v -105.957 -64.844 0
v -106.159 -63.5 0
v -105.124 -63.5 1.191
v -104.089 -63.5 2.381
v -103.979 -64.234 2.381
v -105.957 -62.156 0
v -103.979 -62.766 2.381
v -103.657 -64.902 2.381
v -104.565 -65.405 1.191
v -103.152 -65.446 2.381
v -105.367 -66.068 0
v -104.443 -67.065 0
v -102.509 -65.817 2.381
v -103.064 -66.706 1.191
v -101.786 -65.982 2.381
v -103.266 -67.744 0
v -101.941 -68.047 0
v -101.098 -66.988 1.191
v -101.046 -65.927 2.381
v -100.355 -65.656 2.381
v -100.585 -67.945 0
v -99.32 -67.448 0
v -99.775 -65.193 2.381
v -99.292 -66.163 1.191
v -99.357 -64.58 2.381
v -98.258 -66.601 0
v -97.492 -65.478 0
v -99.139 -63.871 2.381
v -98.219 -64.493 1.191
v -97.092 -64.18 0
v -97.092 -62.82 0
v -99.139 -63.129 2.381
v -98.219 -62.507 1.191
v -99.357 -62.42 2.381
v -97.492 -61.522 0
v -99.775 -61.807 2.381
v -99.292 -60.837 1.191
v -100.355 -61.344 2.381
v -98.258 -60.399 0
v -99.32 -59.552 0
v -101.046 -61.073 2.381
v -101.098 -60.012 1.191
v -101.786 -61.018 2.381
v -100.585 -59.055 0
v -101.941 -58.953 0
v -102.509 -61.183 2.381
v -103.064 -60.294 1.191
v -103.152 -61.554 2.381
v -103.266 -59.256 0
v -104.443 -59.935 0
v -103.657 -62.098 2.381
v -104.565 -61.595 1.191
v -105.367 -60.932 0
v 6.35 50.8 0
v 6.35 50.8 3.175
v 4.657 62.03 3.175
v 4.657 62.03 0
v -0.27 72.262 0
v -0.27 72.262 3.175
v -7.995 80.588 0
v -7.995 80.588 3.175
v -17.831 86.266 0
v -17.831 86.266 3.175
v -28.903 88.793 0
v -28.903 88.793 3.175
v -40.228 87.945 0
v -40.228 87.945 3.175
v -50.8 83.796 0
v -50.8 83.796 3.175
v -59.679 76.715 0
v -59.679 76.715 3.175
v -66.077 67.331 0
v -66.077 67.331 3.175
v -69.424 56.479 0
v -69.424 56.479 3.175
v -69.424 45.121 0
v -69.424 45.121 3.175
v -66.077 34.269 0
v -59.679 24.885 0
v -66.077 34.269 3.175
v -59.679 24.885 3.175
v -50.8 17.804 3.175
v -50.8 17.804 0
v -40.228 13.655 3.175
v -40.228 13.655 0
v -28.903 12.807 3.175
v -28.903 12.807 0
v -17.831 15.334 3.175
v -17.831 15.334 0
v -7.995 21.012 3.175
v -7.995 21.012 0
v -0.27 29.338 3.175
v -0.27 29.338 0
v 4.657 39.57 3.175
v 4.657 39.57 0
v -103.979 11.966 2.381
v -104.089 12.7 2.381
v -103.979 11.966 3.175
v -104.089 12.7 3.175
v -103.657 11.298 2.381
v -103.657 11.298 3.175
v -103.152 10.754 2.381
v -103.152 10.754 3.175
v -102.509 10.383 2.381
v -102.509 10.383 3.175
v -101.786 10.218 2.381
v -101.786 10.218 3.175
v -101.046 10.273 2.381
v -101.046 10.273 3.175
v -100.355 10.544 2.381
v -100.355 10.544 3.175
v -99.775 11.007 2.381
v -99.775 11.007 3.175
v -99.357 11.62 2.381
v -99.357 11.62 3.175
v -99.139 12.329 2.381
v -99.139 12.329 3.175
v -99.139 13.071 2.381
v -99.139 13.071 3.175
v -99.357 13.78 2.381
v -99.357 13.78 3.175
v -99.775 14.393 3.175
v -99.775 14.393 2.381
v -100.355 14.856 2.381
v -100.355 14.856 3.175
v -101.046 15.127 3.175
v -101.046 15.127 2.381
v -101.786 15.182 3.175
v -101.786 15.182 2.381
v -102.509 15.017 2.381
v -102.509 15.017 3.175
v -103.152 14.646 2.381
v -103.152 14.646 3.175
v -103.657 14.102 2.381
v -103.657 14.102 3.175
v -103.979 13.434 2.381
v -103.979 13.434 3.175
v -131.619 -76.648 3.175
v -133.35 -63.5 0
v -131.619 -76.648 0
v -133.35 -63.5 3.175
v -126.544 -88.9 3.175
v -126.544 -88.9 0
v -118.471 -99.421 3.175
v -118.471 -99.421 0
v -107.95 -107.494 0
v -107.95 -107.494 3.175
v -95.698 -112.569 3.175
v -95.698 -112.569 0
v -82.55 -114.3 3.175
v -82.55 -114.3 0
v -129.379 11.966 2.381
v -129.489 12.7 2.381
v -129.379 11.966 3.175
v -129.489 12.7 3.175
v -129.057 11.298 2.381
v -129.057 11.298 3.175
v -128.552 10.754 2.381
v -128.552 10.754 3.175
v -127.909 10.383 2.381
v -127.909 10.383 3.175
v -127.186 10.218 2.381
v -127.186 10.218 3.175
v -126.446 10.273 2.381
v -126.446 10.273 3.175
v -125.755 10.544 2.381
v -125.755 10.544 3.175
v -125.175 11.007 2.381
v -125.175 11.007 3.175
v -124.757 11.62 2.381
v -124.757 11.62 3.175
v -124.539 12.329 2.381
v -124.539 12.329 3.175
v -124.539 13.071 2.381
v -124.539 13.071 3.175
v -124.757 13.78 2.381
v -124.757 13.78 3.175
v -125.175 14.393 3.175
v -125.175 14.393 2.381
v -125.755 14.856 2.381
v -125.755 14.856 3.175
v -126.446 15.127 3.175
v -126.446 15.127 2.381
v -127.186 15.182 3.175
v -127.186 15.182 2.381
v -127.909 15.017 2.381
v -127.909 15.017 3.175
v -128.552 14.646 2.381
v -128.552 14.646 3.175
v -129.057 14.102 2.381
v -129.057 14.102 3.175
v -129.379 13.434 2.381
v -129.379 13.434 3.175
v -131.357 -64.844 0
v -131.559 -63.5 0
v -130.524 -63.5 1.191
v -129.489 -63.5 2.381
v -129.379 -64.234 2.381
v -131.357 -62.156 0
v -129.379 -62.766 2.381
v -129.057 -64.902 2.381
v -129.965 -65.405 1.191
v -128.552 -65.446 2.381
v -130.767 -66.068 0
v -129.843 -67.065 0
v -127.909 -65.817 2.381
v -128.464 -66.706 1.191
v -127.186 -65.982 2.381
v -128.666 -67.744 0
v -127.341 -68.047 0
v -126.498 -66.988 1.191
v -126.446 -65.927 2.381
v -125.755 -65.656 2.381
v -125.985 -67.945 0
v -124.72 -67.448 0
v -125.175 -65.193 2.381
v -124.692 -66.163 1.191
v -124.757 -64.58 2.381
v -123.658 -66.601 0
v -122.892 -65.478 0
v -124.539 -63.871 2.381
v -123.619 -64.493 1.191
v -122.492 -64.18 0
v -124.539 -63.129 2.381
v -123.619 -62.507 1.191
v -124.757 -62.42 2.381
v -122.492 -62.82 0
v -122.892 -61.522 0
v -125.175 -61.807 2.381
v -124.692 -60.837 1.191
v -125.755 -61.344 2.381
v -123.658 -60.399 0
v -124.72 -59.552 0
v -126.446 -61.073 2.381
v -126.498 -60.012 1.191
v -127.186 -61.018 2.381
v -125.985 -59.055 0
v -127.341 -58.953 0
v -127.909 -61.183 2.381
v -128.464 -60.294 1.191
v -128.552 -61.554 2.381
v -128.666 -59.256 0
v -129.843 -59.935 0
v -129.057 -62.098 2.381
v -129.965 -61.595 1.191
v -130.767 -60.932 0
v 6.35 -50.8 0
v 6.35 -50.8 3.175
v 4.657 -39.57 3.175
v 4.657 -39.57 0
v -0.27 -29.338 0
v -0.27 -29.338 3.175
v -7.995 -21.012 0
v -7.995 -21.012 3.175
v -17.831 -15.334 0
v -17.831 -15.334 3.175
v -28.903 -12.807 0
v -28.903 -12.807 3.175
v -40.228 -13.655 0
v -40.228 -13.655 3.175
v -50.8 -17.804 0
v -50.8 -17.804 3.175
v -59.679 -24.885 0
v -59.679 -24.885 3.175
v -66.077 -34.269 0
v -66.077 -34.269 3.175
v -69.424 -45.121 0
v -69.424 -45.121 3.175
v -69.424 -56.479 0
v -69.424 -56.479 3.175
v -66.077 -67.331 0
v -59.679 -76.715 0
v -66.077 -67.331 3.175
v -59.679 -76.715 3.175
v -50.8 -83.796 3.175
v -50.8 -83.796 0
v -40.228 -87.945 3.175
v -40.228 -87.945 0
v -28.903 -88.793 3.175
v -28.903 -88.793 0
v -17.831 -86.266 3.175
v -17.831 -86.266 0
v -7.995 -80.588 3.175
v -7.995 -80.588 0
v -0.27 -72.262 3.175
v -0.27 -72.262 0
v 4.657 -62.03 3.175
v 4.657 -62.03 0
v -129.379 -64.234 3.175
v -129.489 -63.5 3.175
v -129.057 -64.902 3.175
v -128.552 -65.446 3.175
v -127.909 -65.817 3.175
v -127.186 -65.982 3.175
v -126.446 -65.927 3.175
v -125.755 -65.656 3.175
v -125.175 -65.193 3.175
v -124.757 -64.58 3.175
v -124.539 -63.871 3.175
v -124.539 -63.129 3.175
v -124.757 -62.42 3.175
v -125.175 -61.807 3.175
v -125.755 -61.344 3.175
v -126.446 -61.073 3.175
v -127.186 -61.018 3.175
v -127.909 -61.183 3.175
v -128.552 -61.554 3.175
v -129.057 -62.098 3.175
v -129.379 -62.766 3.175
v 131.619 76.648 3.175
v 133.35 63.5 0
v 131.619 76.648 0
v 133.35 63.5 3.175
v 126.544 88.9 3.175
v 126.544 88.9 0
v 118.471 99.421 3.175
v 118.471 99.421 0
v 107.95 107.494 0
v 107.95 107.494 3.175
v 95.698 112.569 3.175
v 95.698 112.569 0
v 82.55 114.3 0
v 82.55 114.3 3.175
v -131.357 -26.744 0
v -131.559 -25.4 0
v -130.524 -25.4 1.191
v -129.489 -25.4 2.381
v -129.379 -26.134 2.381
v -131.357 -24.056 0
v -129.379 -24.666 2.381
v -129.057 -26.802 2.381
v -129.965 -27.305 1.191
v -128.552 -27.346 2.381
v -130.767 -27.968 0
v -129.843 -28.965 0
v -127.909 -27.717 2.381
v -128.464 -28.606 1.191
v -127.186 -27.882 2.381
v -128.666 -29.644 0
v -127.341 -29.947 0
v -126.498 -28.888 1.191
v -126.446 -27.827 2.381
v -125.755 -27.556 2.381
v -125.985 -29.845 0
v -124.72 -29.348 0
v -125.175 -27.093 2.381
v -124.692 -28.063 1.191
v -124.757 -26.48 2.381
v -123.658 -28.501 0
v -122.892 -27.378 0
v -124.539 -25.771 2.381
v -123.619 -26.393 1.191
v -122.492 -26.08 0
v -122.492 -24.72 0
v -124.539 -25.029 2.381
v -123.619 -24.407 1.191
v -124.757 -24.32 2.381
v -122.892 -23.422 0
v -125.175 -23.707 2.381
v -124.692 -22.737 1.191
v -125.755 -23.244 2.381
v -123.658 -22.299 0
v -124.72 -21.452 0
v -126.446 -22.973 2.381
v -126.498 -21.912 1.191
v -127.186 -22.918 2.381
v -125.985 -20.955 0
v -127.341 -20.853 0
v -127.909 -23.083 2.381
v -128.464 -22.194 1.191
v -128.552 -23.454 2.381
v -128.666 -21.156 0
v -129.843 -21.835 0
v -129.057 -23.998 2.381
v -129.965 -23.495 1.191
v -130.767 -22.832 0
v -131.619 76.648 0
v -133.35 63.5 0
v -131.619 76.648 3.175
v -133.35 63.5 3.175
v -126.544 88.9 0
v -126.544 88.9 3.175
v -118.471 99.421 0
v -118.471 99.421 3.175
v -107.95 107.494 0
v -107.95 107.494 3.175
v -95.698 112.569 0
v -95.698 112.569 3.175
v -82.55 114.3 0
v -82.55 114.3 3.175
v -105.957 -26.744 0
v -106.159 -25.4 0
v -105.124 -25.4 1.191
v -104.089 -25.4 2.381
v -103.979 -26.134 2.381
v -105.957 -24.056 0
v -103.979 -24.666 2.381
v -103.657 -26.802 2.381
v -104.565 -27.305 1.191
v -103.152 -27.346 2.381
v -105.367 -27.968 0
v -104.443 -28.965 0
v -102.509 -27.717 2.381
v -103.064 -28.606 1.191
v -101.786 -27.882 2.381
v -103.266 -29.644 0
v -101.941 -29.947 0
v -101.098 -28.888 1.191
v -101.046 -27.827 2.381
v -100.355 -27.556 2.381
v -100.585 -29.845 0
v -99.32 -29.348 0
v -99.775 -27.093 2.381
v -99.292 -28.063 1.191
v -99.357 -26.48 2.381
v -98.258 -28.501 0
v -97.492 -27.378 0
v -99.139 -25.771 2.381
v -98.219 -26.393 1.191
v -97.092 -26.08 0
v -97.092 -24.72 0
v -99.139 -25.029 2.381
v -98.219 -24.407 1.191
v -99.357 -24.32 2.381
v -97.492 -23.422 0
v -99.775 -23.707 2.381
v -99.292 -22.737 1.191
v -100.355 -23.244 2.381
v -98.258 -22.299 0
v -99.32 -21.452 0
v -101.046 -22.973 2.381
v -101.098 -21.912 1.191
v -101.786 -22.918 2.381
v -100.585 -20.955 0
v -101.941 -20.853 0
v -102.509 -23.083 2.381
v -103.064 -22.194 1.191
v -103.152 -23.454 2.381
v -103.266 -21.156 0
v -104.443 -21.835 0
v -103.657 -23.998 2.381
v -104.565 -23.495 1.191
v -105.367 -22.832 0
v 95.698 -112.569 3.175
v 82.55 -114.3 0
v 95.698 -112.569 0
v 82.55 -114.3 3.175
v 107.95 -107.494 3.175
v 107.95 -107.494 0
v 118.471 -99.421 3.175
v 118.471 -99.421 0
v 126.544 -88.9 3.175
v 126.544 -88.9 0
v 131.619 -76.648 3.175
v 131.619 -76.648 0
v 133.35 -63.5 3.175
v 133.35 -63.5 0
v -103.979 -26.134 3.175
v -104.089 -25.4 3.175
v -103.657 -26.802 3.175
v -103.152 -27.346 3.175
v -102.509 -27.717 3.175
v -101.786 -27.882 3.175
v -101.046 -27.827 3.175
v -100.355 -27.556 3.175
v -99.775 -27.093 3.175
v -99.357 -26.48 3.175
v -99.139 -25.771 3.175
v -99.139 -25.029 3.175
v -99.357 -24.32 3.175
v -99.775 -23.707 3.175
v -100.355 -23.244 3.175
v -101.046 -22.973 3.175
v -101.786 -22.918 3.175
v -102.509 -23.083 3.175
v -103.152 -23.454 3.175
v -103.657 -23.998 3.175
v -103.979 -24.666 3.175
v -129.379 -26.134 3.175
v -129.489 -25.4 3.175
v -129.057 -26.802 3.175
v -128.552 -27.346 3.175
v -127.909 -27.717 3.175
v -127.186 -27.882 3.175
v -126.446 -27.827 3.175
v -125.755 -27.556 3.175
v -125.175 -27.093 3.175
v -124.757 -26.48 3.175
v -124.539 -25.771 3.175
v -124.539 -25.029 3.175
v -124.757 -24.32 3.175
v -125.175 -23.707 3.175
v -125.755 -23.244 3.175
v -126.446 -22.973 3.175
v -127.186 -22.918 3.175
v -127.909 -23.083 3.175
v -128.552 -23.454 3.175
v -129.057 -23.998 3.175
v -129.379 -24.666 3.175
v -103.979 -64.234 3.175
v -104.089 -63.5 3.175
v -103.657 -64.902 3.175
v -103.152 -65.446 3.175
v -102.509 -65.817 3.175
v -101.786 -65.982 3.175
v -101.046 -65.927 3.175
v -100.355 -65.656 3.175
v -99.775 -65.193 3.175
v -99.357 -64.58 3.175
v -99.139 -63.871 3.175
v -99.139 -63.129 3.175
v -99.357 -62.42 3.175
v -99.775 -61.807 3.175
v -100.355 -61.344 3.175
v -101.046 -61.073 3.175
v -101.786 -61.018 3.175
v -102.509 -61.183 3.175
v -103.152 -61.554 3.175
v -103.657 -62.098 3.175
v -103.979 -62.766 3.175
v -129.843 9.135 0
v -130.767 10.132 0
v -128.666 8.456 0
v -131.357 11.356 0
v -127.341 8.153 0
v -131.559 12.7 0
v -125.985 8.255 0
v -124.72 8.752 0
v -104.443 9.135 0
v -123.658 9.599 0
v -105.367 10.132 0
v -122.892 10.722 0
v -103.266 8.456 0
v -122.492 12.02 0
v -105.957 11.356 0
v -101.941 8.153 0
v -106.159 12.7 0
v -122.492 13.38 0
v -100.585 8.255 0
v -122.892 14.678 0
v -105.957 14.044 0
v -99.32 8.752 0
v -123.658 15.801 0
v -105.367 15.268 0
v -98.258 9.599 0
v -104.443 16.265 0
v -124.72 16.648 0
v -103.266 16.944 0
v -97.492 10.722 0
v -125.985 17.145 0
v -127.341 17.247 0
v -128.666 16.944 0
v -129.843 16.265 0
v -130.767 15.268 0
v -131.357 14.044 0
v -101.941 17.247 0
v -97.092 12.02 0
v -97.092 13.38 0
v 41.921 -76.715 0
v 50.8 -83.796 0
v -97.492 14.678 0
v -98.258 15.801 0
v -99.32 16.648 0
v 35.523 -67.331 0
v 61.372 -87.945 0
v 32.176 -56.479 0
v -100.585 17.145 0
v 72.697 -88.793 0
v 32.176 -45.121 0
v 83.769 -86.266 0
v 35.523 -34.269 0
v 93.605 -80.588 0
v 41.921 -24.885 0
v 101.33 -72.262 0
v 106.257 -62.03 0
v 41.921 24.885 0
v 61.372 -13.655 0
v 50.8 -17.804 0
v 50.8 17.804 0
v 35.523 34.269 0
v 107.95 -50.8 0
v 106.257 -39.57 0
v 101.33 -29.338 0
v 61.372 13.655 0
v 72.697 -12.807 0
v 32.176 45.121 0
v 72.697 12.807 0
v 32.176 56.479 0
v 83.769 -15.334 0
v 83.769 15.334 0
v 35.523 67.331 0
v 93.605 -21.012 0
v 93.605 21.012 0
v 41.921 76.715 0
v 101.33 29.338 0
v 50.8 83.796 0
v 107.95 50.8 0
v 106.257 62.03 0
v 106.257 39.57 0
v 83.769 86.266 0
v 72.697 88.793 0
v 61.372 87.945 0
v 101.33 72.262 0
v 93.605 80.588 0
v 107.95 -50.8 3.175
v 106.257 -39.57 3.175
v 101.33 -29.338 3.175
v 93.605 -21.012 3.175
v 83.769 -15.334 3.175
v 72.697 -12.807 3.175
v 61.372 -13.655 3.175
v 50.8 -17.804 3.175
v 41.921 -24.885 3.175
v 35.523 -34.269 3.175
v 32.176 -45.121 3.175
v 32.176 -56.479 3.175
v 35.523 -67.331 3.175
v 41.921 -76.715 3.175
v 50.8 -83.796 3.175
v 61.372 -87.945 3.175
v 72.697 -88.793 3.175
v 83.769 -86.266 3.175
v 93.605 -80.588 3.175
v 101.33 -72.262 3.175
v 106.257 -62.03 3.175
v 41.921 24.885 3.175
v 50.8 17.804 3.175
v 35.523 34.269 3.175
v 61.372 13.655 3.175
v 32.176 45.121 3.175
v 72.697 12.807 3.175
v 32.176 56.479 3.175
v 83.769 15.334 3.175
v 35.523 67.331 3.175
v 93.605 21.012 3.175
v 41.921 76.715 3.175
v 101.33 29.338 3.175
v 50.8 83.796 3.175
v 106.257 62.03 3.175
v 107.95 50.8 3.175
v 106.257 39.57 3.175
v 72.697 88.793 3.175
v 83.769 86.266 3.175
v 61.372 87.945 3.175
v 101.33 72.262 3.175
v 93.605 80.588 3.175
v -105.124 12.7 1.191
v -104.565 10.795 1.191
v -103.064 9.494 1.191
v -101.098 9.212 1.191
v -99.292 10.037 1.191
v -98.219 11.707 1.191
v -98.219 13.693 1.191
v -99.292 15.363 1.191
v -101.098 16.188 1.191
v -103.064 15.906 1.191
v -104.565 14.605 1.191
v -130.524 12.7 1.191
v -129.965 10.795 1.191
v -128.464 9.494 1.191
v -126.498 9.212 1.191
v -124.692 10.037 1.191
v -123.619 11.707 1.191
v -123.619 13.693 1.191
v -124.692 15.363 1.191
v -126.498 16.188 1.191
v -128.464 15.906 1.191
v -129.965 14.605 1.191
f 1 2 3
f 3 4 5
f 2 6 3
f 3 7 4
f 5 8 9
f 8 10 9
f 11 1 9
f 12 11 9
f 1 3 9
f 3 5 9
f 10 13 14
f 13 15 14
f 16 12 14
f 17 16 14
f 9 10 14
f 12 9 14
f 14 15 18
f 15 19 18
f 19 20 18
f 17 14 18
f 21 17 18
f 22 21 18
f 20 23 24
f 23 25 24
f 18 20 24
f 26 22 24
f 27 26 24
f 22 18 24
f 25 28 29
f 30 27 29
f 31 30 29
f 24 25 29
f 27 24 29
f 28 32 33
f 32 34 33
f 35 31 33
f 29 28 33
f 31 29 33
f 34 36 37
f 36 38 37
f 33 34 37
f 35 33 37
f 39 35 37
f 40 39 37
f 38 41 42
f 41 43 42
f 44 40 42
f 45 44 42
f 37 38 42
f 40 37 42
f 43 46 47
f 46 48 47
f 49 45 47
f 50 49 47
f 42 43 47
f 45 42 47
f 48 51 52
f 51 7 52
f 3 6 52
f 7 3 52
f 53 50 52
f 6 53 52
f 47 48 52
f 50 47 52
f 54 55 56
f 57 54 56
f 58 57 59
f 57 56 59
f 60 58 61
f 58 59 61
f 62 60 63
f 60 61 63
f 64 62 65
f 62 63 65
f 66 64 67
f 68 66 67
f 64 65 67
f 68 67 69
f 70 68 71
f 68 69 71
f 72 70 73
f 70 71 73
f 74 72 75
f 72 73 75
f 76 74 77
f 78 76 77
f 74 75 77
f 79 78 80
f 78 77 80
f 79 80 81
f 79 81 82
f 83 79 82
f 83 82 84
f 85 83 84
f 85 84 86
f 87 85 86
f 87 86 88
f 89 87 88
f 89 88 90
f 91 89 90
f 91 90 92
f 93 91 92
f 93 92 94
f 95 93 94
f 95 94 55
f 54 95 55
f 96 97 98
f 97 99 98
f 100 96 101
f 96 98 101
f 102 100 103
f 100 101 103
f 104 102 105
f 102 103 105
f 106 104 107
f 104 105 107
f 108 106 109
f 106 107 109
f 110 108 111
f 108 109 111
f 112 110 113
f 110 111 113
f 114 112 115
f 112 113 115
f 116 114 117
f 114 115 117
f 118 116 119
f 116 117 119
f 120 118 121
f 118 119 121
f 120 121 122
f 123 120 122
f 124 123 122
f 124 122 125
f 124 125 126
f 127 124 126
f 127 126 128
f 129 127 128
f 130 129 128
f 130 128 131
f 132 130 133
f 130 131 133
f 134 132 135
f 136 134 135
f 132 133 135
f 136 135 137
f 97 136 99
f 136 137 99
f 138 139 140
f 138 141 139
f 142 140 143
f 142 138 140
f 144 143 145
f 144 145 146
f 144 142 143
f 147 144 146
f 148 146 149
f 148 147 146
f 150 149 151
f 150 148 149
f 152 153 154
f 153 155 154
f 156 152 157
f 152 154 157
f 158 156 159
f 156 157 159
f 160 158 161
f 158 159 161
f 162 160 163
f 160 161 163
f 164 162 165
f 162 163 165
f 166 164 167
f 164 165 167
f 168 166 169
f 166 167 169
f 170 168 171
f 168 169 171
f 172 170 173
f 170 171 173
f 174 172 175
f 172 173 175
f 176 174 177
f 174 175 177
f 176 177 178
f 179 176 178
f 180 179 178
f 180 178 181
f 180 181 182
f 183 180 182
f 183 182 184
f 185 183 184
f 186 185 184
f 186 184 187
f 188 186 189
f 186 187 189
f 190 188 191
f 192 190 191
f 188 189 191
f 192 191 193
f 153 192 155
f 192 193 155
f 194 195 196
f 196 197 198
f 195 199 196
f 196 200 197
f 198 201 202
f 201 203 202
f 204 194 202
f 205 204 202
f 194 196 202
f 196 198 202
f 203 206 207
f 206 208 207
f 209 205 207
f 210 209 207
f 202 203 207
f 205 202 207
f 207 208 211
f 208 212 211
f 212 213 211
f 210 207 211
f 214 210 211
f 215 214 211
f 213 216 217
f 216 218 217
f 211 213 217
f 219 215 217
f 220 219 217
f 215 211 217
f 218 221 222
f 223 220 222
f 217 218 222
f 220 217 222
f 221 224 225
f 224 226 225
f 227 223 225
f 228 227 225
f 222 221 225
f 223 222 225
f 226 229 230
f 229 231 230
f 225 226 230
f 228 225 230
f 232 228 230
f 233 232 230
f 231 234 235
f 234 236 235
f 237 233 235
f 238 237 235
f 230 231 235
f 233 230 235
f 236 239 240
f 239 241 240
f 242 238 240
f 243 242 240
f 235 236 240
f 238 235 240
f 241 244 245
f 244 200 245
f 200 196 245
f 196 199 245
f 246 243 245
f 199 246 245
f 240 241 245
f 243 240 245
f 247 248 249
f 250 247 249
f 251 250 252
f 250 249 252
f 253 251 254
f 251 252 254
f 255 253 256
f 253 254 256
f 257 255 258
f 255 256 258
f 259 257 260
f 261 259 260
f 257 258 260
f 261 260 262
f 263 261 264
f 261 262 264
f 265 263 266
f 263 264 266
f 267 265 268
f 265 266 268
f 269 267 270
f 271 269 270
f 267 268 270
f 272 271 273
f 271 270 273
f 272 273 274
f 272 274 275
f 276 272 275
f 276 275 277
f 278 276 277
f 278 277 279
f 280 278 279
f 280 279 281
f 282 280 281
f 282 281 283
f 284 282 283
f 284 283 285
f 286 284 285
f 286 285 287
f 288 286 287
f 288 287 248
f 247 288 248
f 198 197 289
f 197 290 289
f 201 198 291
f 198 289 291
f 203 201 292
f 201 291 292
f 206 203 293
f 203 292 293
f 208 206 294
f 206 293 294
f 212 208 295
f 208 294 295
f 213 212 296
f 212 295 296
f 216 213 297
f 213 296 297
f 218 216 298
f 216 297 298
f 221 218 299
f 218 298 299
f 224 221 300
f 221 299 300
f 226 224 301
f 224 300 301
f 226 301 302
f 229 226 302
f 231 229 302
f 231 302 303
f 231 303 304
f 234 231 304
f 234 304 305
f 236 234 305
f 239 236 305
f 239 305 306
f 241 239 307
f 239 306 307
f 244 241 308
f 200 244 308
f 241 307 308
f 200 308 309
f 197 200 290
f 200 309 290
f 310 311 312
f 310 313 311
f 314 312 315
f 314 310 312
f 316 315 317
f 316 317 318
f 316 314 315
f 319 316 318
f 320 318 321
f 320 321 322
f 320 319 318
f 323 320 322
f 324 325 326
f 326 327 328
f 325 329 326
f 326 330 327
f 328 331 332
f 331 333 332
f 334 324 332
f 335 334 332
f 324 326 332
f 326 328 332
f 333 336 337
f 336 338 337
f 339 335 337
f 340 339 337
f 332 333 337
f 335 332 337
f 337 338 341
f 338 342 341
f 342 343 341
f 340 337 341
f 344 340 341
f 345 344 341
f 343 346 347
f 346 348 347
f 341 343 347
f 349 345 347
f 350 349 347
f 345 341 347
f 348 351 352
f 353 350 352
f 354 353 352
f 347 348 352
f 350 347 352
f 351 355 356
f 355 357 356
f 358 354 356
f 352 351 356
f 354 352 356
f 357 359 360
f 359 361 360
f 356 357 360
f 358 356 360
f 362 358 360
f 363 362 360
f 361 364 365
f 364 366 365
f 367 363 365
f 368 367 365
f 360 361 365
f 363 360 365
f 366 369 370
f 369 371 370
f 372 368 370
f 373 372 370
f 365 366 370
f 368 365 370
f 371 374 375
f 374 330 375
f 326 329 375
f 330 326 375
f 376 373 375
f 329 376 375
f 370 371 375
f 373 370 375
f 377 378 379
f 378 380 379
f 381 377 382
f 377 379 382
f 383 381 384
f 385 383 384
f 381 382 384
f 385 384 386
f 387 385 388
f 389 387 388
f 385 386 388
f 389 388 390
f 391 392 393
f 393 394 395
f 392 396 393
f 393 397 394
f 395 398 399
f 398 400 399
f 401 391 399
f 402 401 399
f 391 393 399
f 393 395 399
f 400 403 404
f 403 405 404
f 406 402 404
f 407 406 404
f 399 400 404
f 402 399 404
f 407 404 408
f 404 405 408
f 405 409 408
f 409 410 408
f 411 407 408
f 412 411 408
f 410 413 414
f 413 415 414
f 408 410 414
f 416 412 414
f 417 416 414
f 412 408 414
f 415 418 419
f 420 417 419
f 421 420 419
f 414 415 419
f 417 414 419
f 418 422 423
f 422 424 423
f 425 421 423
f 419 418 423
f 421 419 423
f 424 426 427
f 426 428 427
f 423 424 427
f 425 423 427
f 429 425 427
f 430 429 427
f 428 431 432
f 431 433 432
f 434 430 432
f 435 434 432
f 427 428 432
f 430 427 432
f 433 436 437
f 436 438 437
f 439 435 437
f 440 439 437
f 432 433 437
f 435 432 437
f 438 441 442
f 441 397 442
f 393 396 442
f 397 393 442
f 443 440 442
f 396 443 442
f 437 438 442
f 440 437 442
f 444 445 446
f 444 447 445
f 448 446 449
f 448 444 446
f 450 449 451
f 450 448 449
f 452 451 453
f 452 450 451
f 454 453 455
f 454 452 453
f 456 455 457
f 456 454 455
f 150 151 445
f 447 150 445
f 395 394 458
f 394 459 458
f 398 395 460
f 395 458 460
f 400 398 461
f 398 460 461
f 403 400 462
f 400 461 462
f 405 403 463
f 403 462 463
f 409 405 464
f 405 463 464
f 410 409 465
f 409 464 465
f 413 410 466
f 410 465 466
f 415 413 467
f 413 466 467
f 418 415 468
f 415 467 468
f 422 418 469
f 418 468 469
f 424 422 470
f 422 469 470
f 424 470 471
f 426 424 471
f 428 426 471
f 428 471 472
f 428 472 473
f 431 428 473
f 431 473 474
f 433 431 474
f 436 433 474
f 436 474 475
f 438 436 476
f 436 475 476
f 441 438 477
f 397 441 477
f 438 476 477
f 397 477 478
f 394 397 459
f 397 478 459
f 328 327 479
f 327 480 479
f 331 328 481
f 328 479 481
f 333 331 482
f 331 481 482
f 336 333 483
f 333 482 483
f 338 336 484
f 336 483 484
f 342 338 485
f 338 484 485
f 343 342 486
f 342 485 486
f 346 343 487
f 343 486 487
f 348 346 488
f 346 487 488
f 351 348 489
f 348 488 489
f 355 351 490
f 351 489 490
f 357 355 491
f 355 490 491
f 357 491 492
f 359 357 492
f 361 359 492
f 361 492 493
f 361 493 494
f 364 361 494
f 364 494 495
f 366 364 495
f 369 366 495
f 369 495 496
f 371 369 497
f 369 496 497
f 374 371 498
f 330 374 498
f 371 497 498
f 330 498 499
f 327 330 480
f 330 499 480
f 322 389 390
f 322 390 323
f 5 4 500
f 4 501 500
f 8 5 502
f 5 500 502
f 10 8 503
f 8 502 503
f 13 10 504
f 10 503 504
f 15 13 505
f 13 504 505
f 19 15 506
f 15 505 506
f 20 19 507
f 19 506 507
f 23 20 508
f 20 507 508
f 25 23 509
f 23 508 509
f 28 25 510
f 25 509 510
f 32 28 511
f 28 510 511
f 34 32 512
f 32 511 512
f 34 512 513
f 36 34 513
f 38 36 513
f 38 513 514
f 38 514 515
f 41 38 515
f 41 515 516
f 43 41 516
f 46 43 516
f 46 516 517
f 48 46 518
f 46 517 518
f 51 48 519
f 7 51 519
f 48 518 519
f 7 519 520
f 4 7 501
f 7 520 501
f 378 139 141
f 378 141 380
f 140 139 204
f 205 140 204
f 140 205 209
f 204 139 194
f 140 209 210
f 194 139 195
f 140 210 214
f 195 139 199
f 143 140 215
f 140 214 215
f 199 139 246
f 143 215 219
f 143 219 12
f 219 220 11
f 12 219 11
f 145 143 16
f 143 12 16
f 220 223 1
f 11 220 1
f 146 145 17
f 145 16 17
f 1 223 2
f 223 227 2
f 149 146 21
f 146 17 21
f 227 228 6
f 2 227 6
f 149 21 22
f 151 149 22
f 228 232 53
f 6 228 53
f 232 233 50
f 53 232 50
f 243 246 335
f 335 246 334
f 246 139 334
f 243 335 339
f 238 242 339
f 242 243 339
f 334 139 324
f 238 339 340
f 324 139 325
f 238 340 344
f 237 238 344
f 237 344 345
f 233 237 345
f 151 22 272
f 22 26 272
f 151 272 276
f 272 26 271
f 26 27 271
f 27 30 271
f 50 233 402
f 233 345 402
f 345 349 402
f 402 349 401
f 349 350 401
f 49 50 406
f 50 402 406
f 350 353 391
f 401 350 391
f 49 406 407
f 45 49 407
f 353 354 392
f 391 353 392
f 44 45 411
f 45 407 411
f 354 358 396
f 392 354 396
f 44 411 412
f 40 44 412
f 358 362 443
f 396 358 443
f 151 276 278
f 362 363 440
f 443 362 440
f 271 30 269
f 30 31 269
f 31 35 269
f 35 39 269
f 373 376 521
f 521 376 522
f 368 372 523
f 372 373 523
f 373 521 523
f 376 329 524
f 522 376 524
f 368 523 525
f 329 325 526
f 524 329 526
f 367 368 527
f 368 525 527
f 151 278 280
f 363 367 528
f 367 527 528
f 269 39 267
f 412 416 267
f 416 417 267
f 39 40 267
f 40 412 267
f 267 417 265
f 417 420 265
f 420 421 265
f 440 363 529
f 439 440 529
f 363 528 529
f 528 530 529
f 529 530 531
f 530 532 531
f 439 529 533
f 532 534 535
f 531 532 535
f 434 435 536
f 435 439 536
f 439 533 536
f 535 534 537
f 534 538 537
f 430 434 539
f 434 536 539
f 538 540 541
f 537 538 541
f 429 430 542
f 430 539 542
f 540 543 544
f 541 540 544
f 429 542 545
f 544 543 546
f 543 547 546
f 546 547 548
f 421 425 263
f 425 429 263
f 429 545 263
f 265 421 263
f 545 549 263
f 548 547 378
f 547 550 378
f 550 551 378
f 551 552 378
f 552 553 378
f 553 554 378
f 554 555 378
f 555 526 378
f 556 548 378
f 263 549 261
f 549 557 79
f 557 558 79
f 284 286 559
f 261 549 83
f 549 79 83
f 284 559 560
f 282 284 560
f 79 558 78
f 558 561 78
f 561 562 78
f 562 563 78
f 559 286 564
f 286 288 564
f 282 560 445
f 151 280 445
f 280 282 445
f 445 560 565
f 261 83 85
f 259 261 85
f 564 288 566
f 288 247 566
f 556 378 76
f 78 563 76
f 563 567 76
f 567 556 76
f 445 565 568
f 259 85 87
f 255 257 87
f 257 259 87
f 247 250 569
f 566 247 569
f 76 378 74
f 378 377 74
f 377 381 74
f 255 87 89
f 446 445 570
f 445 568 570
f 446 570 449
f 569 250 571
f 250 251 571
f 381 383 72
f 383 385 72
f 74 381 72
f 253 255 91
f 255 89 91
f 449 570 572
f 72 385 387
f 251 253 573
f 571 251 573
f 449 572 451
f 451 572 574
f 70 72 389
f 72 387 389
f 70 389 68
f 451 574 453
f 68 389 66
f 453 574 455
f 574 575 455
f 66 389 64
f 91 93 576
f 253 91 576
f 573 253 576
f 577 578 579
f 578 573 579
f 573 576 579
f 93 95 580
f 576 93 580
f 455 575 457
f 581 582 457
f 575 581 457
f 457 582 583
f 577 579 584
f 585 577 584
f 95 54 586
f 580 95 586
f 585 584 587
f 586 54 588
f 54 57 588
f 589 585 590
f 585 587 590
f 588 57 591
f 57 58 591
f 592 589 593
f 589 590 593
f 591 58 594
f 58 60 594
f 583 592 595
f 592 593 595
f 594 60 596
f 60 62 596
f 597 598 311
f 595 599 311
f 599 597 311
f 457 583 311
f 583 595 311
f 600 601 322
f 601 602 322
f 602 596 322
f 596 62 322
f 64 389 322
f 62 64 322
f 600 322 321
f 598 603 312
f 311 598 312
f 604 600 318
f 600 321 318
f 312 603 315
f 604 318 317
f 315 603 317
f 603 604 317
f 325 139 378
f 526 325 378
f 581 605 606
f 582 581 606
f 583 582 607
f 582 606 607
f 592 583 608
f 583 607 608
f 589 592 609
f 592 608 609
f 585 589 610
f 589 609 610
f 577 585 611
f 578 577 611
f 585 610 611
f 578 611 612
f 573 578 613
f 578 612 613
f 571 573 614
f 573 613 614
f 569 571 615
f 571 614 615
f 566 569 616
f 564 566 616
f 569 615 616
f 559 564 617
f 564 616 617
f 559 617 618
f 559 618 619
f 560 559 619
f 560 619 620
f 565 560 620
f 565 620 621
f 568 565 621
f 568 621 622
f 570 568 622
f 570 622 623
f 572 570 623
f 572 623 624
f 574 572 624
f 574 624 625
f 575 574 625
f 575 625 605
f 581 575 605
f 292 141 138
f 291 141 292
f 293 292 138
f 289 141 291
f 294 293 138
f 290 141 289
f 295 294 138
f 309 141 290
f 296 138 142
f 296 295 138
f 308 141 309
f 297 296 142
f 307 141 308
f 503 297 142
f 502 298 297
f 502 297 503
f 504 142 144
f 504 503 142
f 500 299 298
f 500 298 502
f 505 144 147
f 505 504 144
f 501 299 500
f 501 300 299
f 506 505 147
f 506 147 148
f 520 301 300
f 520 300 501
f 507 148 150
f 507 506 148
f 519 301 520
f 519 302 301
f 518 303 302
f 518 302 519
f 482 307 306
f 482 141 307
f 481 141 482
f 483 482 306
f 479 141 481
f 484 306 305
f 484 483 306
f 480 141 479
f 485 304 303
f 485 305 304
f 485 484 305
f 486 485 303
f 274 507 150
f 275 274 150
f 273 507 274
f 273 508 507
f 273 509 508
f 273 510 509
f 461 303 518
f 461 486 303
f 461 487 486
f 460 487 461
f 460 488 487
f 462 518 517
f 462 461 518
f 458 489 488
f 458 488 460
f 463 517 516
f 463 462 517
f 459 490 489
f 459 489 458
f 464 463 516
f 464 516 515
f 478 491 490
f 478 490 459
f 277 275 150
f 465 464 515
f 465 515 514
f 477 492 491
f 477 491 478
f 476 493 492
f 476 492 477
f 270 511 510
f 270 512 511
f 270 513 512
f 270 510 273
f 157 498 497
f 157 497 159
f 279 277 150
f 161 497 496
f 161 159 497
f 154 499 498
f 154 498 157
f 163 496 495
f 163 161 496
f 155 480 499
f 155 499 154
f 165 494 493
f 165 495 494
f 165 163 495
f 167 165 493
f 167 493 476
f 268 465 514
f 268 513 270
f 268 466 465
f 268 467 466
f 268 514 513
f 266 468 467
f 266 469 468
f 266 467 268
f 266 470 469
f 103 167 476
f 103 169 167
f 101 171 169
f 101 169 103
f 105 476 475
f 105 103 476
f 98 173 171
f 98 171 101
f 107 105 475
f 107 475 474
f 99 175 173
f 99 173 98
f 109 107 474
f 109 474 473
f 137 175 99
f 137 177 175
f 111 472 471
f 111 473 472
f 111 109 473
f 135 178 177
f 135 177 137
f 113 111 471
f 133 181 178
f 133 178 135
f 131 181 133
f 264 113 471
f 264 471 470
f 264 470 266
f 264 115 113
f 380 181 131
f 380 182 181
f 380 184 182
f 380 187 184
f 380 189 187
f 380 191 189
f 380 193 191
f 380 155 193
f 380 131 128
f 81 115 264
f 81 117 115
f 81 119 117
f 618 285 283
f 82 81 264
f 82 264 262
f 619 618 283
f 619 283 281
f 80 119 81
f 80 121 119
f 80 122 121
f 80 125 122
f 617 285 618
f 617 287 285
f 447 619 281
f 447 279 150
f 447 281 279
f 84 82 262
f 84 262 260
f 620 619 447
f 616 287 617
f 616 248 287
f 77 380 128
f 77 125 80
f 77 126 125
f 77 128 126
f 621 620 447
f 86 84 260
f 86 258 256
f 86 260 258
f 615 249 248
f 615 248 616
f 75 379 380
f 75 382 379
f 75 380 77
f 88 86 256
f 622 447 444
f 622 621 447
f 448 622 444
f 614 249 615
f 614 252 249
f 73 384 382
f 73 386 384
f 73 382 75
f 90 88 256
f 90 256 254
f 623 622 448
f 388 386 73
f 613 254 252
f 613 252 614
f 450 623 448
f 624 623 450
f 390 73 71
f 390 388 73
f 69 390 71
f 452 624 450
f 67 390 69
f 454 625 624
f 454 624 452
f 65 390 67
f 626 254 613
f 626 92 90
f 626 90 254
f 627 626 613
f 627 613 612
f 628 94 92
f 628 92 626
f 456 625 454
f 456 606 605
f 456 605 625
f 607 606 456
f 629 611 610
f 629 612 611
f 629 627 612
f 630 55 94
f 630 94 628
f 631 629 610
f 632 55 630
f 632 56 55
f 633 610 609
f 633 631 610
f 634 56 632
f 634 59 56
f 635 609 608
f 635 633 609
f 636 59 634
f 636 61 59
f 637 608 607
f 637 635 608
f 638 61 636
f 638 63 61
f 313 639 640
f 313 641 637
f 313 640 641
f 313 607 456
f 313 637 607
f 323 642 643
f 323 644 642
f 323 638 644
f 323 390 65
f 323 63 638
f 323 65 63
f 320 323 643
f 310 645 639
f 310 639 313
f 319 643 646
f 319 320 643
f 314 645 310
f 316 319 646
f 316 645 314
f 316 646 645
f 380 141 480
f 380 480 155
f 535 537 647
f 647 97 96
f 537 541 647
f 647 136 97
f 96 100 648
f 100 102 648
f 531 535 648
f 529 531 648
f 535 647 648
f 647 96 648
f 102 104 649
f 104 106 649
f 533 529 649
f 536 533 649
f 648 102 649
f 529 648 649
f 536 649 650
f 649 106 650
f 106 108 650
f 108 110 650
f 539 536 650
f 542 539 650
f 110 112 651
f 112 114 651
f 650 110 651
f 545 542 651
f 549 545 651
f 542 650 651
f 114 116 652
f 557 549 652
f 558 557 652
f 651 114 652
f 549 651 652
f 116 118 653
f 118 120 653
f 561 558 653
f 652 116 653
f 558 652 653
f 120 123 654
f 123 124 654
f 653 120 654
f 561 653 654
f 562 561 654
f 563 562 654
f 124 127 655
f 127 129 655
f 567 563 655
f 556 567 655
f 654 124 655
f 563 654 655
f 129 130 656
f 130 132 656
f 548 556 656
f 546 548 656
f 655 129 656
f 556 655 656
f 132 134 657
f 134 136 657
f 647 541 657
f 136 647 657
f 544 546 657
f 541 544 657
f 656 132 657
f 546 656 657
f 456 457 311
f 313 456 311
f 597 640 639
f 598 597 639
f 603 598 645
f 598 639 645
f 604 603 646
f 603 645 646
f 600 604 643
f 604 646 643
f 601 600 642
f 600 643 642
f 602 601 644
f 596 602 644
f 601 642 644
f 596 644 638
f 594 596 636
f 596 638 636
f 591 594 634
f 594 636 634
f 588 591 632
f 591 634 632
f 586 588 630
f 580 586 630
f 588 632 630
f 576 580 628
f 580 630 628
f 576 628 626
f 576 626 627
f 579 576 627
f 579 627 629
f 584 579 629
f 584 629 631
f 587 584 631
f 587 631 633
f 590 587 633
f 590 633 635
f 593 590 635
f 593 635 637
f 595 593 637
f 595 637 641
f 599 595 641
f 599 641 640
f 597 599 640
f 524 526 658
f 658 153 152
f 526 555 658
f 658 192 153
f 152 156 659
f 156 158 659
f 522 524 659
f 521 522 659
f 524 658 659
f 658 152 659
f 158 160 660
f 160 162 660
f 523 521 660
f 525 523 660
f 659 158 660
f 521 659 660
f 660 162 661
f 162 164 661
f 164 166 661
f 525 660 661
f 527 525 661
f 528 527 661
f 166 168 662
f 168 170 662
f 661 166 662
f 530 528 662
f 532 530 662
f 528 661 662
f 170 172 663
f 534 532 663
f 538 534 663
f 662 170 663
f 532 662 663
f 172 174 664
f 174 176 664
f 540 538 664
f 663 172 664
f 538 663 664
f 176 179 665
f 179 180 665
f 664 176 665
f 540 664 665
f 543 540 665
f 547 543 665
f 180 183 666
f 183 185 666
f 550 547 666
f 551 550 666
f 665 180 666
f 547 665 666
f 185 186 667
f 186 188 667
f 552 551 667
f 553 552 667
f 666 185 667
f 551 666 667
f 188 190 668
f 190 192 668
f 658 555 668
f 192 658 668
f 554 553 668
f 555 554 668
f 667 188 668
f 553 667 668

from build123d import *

# Parameters (mm, degrees)
F0_W           = 266.7
F0_H           = 228.6
F1_DEPTH       = 3.175
F2_R           = 50.8
F4_D           = 4.9784
F4_CSINK_D     = 9.1186
F4_CSINK_ANGLE = 82
F5_R           = 38.1
F6_DEPTH       = 3.176


with BuildPart() as f1:
    # F0 (on Top) → F1 (new body)
    with BuildSketch(Plane.XY):
        Rectangle(F0_W, F0_H)
    extrude(amount=F1_DEPTH)

    # F2
    f2_edges = [f1.edges().sort_by_distance(p)[0] for p in [
        (-133.35, 114.3, 1.5875),
        (133.35, 114.3, 1.5875),
        (133.35, -114.3, 1.5875),
        (-133.35, -114.3, 1.5875),
    ]]
    fillet(f2_edges, radius=F2_R)

    # F4 (through all)
    with Locations(Plane(origin=(0, 0, 0), x_dir=(1, 0, 0), z_dir=(0, 0, -1))):
        with Locations((-127, -12.7), (-101.6, -12.7), (-101.6, 25.4), (-127, 25.4), (-127, 63.5), (-101.6, 63.5)):
            CounterSinkHole(F4_D / 2, F4_CSINK_D / 2, counter_sink_angle=F4_CSINK_ANGLE)

    # F5 (on face) → F6 (cut, through all)
    with BuildSketch(Plane.XY.offset(3.175)):
        with Locations((-31.75, 50.8)):
            Circle(F5_R)
        with Locations((69.85, 50.8)):
            Circle(F5_R)
        with Locations((-31.75, -50.8)):
            Circle(F5_R)
        with Locations((69.85, -50.8)):
            Circle(F5_R)
    extrude(amount=-F6_DEPTH, mode=Mode.SUBTRACT)


solid = f1.part
